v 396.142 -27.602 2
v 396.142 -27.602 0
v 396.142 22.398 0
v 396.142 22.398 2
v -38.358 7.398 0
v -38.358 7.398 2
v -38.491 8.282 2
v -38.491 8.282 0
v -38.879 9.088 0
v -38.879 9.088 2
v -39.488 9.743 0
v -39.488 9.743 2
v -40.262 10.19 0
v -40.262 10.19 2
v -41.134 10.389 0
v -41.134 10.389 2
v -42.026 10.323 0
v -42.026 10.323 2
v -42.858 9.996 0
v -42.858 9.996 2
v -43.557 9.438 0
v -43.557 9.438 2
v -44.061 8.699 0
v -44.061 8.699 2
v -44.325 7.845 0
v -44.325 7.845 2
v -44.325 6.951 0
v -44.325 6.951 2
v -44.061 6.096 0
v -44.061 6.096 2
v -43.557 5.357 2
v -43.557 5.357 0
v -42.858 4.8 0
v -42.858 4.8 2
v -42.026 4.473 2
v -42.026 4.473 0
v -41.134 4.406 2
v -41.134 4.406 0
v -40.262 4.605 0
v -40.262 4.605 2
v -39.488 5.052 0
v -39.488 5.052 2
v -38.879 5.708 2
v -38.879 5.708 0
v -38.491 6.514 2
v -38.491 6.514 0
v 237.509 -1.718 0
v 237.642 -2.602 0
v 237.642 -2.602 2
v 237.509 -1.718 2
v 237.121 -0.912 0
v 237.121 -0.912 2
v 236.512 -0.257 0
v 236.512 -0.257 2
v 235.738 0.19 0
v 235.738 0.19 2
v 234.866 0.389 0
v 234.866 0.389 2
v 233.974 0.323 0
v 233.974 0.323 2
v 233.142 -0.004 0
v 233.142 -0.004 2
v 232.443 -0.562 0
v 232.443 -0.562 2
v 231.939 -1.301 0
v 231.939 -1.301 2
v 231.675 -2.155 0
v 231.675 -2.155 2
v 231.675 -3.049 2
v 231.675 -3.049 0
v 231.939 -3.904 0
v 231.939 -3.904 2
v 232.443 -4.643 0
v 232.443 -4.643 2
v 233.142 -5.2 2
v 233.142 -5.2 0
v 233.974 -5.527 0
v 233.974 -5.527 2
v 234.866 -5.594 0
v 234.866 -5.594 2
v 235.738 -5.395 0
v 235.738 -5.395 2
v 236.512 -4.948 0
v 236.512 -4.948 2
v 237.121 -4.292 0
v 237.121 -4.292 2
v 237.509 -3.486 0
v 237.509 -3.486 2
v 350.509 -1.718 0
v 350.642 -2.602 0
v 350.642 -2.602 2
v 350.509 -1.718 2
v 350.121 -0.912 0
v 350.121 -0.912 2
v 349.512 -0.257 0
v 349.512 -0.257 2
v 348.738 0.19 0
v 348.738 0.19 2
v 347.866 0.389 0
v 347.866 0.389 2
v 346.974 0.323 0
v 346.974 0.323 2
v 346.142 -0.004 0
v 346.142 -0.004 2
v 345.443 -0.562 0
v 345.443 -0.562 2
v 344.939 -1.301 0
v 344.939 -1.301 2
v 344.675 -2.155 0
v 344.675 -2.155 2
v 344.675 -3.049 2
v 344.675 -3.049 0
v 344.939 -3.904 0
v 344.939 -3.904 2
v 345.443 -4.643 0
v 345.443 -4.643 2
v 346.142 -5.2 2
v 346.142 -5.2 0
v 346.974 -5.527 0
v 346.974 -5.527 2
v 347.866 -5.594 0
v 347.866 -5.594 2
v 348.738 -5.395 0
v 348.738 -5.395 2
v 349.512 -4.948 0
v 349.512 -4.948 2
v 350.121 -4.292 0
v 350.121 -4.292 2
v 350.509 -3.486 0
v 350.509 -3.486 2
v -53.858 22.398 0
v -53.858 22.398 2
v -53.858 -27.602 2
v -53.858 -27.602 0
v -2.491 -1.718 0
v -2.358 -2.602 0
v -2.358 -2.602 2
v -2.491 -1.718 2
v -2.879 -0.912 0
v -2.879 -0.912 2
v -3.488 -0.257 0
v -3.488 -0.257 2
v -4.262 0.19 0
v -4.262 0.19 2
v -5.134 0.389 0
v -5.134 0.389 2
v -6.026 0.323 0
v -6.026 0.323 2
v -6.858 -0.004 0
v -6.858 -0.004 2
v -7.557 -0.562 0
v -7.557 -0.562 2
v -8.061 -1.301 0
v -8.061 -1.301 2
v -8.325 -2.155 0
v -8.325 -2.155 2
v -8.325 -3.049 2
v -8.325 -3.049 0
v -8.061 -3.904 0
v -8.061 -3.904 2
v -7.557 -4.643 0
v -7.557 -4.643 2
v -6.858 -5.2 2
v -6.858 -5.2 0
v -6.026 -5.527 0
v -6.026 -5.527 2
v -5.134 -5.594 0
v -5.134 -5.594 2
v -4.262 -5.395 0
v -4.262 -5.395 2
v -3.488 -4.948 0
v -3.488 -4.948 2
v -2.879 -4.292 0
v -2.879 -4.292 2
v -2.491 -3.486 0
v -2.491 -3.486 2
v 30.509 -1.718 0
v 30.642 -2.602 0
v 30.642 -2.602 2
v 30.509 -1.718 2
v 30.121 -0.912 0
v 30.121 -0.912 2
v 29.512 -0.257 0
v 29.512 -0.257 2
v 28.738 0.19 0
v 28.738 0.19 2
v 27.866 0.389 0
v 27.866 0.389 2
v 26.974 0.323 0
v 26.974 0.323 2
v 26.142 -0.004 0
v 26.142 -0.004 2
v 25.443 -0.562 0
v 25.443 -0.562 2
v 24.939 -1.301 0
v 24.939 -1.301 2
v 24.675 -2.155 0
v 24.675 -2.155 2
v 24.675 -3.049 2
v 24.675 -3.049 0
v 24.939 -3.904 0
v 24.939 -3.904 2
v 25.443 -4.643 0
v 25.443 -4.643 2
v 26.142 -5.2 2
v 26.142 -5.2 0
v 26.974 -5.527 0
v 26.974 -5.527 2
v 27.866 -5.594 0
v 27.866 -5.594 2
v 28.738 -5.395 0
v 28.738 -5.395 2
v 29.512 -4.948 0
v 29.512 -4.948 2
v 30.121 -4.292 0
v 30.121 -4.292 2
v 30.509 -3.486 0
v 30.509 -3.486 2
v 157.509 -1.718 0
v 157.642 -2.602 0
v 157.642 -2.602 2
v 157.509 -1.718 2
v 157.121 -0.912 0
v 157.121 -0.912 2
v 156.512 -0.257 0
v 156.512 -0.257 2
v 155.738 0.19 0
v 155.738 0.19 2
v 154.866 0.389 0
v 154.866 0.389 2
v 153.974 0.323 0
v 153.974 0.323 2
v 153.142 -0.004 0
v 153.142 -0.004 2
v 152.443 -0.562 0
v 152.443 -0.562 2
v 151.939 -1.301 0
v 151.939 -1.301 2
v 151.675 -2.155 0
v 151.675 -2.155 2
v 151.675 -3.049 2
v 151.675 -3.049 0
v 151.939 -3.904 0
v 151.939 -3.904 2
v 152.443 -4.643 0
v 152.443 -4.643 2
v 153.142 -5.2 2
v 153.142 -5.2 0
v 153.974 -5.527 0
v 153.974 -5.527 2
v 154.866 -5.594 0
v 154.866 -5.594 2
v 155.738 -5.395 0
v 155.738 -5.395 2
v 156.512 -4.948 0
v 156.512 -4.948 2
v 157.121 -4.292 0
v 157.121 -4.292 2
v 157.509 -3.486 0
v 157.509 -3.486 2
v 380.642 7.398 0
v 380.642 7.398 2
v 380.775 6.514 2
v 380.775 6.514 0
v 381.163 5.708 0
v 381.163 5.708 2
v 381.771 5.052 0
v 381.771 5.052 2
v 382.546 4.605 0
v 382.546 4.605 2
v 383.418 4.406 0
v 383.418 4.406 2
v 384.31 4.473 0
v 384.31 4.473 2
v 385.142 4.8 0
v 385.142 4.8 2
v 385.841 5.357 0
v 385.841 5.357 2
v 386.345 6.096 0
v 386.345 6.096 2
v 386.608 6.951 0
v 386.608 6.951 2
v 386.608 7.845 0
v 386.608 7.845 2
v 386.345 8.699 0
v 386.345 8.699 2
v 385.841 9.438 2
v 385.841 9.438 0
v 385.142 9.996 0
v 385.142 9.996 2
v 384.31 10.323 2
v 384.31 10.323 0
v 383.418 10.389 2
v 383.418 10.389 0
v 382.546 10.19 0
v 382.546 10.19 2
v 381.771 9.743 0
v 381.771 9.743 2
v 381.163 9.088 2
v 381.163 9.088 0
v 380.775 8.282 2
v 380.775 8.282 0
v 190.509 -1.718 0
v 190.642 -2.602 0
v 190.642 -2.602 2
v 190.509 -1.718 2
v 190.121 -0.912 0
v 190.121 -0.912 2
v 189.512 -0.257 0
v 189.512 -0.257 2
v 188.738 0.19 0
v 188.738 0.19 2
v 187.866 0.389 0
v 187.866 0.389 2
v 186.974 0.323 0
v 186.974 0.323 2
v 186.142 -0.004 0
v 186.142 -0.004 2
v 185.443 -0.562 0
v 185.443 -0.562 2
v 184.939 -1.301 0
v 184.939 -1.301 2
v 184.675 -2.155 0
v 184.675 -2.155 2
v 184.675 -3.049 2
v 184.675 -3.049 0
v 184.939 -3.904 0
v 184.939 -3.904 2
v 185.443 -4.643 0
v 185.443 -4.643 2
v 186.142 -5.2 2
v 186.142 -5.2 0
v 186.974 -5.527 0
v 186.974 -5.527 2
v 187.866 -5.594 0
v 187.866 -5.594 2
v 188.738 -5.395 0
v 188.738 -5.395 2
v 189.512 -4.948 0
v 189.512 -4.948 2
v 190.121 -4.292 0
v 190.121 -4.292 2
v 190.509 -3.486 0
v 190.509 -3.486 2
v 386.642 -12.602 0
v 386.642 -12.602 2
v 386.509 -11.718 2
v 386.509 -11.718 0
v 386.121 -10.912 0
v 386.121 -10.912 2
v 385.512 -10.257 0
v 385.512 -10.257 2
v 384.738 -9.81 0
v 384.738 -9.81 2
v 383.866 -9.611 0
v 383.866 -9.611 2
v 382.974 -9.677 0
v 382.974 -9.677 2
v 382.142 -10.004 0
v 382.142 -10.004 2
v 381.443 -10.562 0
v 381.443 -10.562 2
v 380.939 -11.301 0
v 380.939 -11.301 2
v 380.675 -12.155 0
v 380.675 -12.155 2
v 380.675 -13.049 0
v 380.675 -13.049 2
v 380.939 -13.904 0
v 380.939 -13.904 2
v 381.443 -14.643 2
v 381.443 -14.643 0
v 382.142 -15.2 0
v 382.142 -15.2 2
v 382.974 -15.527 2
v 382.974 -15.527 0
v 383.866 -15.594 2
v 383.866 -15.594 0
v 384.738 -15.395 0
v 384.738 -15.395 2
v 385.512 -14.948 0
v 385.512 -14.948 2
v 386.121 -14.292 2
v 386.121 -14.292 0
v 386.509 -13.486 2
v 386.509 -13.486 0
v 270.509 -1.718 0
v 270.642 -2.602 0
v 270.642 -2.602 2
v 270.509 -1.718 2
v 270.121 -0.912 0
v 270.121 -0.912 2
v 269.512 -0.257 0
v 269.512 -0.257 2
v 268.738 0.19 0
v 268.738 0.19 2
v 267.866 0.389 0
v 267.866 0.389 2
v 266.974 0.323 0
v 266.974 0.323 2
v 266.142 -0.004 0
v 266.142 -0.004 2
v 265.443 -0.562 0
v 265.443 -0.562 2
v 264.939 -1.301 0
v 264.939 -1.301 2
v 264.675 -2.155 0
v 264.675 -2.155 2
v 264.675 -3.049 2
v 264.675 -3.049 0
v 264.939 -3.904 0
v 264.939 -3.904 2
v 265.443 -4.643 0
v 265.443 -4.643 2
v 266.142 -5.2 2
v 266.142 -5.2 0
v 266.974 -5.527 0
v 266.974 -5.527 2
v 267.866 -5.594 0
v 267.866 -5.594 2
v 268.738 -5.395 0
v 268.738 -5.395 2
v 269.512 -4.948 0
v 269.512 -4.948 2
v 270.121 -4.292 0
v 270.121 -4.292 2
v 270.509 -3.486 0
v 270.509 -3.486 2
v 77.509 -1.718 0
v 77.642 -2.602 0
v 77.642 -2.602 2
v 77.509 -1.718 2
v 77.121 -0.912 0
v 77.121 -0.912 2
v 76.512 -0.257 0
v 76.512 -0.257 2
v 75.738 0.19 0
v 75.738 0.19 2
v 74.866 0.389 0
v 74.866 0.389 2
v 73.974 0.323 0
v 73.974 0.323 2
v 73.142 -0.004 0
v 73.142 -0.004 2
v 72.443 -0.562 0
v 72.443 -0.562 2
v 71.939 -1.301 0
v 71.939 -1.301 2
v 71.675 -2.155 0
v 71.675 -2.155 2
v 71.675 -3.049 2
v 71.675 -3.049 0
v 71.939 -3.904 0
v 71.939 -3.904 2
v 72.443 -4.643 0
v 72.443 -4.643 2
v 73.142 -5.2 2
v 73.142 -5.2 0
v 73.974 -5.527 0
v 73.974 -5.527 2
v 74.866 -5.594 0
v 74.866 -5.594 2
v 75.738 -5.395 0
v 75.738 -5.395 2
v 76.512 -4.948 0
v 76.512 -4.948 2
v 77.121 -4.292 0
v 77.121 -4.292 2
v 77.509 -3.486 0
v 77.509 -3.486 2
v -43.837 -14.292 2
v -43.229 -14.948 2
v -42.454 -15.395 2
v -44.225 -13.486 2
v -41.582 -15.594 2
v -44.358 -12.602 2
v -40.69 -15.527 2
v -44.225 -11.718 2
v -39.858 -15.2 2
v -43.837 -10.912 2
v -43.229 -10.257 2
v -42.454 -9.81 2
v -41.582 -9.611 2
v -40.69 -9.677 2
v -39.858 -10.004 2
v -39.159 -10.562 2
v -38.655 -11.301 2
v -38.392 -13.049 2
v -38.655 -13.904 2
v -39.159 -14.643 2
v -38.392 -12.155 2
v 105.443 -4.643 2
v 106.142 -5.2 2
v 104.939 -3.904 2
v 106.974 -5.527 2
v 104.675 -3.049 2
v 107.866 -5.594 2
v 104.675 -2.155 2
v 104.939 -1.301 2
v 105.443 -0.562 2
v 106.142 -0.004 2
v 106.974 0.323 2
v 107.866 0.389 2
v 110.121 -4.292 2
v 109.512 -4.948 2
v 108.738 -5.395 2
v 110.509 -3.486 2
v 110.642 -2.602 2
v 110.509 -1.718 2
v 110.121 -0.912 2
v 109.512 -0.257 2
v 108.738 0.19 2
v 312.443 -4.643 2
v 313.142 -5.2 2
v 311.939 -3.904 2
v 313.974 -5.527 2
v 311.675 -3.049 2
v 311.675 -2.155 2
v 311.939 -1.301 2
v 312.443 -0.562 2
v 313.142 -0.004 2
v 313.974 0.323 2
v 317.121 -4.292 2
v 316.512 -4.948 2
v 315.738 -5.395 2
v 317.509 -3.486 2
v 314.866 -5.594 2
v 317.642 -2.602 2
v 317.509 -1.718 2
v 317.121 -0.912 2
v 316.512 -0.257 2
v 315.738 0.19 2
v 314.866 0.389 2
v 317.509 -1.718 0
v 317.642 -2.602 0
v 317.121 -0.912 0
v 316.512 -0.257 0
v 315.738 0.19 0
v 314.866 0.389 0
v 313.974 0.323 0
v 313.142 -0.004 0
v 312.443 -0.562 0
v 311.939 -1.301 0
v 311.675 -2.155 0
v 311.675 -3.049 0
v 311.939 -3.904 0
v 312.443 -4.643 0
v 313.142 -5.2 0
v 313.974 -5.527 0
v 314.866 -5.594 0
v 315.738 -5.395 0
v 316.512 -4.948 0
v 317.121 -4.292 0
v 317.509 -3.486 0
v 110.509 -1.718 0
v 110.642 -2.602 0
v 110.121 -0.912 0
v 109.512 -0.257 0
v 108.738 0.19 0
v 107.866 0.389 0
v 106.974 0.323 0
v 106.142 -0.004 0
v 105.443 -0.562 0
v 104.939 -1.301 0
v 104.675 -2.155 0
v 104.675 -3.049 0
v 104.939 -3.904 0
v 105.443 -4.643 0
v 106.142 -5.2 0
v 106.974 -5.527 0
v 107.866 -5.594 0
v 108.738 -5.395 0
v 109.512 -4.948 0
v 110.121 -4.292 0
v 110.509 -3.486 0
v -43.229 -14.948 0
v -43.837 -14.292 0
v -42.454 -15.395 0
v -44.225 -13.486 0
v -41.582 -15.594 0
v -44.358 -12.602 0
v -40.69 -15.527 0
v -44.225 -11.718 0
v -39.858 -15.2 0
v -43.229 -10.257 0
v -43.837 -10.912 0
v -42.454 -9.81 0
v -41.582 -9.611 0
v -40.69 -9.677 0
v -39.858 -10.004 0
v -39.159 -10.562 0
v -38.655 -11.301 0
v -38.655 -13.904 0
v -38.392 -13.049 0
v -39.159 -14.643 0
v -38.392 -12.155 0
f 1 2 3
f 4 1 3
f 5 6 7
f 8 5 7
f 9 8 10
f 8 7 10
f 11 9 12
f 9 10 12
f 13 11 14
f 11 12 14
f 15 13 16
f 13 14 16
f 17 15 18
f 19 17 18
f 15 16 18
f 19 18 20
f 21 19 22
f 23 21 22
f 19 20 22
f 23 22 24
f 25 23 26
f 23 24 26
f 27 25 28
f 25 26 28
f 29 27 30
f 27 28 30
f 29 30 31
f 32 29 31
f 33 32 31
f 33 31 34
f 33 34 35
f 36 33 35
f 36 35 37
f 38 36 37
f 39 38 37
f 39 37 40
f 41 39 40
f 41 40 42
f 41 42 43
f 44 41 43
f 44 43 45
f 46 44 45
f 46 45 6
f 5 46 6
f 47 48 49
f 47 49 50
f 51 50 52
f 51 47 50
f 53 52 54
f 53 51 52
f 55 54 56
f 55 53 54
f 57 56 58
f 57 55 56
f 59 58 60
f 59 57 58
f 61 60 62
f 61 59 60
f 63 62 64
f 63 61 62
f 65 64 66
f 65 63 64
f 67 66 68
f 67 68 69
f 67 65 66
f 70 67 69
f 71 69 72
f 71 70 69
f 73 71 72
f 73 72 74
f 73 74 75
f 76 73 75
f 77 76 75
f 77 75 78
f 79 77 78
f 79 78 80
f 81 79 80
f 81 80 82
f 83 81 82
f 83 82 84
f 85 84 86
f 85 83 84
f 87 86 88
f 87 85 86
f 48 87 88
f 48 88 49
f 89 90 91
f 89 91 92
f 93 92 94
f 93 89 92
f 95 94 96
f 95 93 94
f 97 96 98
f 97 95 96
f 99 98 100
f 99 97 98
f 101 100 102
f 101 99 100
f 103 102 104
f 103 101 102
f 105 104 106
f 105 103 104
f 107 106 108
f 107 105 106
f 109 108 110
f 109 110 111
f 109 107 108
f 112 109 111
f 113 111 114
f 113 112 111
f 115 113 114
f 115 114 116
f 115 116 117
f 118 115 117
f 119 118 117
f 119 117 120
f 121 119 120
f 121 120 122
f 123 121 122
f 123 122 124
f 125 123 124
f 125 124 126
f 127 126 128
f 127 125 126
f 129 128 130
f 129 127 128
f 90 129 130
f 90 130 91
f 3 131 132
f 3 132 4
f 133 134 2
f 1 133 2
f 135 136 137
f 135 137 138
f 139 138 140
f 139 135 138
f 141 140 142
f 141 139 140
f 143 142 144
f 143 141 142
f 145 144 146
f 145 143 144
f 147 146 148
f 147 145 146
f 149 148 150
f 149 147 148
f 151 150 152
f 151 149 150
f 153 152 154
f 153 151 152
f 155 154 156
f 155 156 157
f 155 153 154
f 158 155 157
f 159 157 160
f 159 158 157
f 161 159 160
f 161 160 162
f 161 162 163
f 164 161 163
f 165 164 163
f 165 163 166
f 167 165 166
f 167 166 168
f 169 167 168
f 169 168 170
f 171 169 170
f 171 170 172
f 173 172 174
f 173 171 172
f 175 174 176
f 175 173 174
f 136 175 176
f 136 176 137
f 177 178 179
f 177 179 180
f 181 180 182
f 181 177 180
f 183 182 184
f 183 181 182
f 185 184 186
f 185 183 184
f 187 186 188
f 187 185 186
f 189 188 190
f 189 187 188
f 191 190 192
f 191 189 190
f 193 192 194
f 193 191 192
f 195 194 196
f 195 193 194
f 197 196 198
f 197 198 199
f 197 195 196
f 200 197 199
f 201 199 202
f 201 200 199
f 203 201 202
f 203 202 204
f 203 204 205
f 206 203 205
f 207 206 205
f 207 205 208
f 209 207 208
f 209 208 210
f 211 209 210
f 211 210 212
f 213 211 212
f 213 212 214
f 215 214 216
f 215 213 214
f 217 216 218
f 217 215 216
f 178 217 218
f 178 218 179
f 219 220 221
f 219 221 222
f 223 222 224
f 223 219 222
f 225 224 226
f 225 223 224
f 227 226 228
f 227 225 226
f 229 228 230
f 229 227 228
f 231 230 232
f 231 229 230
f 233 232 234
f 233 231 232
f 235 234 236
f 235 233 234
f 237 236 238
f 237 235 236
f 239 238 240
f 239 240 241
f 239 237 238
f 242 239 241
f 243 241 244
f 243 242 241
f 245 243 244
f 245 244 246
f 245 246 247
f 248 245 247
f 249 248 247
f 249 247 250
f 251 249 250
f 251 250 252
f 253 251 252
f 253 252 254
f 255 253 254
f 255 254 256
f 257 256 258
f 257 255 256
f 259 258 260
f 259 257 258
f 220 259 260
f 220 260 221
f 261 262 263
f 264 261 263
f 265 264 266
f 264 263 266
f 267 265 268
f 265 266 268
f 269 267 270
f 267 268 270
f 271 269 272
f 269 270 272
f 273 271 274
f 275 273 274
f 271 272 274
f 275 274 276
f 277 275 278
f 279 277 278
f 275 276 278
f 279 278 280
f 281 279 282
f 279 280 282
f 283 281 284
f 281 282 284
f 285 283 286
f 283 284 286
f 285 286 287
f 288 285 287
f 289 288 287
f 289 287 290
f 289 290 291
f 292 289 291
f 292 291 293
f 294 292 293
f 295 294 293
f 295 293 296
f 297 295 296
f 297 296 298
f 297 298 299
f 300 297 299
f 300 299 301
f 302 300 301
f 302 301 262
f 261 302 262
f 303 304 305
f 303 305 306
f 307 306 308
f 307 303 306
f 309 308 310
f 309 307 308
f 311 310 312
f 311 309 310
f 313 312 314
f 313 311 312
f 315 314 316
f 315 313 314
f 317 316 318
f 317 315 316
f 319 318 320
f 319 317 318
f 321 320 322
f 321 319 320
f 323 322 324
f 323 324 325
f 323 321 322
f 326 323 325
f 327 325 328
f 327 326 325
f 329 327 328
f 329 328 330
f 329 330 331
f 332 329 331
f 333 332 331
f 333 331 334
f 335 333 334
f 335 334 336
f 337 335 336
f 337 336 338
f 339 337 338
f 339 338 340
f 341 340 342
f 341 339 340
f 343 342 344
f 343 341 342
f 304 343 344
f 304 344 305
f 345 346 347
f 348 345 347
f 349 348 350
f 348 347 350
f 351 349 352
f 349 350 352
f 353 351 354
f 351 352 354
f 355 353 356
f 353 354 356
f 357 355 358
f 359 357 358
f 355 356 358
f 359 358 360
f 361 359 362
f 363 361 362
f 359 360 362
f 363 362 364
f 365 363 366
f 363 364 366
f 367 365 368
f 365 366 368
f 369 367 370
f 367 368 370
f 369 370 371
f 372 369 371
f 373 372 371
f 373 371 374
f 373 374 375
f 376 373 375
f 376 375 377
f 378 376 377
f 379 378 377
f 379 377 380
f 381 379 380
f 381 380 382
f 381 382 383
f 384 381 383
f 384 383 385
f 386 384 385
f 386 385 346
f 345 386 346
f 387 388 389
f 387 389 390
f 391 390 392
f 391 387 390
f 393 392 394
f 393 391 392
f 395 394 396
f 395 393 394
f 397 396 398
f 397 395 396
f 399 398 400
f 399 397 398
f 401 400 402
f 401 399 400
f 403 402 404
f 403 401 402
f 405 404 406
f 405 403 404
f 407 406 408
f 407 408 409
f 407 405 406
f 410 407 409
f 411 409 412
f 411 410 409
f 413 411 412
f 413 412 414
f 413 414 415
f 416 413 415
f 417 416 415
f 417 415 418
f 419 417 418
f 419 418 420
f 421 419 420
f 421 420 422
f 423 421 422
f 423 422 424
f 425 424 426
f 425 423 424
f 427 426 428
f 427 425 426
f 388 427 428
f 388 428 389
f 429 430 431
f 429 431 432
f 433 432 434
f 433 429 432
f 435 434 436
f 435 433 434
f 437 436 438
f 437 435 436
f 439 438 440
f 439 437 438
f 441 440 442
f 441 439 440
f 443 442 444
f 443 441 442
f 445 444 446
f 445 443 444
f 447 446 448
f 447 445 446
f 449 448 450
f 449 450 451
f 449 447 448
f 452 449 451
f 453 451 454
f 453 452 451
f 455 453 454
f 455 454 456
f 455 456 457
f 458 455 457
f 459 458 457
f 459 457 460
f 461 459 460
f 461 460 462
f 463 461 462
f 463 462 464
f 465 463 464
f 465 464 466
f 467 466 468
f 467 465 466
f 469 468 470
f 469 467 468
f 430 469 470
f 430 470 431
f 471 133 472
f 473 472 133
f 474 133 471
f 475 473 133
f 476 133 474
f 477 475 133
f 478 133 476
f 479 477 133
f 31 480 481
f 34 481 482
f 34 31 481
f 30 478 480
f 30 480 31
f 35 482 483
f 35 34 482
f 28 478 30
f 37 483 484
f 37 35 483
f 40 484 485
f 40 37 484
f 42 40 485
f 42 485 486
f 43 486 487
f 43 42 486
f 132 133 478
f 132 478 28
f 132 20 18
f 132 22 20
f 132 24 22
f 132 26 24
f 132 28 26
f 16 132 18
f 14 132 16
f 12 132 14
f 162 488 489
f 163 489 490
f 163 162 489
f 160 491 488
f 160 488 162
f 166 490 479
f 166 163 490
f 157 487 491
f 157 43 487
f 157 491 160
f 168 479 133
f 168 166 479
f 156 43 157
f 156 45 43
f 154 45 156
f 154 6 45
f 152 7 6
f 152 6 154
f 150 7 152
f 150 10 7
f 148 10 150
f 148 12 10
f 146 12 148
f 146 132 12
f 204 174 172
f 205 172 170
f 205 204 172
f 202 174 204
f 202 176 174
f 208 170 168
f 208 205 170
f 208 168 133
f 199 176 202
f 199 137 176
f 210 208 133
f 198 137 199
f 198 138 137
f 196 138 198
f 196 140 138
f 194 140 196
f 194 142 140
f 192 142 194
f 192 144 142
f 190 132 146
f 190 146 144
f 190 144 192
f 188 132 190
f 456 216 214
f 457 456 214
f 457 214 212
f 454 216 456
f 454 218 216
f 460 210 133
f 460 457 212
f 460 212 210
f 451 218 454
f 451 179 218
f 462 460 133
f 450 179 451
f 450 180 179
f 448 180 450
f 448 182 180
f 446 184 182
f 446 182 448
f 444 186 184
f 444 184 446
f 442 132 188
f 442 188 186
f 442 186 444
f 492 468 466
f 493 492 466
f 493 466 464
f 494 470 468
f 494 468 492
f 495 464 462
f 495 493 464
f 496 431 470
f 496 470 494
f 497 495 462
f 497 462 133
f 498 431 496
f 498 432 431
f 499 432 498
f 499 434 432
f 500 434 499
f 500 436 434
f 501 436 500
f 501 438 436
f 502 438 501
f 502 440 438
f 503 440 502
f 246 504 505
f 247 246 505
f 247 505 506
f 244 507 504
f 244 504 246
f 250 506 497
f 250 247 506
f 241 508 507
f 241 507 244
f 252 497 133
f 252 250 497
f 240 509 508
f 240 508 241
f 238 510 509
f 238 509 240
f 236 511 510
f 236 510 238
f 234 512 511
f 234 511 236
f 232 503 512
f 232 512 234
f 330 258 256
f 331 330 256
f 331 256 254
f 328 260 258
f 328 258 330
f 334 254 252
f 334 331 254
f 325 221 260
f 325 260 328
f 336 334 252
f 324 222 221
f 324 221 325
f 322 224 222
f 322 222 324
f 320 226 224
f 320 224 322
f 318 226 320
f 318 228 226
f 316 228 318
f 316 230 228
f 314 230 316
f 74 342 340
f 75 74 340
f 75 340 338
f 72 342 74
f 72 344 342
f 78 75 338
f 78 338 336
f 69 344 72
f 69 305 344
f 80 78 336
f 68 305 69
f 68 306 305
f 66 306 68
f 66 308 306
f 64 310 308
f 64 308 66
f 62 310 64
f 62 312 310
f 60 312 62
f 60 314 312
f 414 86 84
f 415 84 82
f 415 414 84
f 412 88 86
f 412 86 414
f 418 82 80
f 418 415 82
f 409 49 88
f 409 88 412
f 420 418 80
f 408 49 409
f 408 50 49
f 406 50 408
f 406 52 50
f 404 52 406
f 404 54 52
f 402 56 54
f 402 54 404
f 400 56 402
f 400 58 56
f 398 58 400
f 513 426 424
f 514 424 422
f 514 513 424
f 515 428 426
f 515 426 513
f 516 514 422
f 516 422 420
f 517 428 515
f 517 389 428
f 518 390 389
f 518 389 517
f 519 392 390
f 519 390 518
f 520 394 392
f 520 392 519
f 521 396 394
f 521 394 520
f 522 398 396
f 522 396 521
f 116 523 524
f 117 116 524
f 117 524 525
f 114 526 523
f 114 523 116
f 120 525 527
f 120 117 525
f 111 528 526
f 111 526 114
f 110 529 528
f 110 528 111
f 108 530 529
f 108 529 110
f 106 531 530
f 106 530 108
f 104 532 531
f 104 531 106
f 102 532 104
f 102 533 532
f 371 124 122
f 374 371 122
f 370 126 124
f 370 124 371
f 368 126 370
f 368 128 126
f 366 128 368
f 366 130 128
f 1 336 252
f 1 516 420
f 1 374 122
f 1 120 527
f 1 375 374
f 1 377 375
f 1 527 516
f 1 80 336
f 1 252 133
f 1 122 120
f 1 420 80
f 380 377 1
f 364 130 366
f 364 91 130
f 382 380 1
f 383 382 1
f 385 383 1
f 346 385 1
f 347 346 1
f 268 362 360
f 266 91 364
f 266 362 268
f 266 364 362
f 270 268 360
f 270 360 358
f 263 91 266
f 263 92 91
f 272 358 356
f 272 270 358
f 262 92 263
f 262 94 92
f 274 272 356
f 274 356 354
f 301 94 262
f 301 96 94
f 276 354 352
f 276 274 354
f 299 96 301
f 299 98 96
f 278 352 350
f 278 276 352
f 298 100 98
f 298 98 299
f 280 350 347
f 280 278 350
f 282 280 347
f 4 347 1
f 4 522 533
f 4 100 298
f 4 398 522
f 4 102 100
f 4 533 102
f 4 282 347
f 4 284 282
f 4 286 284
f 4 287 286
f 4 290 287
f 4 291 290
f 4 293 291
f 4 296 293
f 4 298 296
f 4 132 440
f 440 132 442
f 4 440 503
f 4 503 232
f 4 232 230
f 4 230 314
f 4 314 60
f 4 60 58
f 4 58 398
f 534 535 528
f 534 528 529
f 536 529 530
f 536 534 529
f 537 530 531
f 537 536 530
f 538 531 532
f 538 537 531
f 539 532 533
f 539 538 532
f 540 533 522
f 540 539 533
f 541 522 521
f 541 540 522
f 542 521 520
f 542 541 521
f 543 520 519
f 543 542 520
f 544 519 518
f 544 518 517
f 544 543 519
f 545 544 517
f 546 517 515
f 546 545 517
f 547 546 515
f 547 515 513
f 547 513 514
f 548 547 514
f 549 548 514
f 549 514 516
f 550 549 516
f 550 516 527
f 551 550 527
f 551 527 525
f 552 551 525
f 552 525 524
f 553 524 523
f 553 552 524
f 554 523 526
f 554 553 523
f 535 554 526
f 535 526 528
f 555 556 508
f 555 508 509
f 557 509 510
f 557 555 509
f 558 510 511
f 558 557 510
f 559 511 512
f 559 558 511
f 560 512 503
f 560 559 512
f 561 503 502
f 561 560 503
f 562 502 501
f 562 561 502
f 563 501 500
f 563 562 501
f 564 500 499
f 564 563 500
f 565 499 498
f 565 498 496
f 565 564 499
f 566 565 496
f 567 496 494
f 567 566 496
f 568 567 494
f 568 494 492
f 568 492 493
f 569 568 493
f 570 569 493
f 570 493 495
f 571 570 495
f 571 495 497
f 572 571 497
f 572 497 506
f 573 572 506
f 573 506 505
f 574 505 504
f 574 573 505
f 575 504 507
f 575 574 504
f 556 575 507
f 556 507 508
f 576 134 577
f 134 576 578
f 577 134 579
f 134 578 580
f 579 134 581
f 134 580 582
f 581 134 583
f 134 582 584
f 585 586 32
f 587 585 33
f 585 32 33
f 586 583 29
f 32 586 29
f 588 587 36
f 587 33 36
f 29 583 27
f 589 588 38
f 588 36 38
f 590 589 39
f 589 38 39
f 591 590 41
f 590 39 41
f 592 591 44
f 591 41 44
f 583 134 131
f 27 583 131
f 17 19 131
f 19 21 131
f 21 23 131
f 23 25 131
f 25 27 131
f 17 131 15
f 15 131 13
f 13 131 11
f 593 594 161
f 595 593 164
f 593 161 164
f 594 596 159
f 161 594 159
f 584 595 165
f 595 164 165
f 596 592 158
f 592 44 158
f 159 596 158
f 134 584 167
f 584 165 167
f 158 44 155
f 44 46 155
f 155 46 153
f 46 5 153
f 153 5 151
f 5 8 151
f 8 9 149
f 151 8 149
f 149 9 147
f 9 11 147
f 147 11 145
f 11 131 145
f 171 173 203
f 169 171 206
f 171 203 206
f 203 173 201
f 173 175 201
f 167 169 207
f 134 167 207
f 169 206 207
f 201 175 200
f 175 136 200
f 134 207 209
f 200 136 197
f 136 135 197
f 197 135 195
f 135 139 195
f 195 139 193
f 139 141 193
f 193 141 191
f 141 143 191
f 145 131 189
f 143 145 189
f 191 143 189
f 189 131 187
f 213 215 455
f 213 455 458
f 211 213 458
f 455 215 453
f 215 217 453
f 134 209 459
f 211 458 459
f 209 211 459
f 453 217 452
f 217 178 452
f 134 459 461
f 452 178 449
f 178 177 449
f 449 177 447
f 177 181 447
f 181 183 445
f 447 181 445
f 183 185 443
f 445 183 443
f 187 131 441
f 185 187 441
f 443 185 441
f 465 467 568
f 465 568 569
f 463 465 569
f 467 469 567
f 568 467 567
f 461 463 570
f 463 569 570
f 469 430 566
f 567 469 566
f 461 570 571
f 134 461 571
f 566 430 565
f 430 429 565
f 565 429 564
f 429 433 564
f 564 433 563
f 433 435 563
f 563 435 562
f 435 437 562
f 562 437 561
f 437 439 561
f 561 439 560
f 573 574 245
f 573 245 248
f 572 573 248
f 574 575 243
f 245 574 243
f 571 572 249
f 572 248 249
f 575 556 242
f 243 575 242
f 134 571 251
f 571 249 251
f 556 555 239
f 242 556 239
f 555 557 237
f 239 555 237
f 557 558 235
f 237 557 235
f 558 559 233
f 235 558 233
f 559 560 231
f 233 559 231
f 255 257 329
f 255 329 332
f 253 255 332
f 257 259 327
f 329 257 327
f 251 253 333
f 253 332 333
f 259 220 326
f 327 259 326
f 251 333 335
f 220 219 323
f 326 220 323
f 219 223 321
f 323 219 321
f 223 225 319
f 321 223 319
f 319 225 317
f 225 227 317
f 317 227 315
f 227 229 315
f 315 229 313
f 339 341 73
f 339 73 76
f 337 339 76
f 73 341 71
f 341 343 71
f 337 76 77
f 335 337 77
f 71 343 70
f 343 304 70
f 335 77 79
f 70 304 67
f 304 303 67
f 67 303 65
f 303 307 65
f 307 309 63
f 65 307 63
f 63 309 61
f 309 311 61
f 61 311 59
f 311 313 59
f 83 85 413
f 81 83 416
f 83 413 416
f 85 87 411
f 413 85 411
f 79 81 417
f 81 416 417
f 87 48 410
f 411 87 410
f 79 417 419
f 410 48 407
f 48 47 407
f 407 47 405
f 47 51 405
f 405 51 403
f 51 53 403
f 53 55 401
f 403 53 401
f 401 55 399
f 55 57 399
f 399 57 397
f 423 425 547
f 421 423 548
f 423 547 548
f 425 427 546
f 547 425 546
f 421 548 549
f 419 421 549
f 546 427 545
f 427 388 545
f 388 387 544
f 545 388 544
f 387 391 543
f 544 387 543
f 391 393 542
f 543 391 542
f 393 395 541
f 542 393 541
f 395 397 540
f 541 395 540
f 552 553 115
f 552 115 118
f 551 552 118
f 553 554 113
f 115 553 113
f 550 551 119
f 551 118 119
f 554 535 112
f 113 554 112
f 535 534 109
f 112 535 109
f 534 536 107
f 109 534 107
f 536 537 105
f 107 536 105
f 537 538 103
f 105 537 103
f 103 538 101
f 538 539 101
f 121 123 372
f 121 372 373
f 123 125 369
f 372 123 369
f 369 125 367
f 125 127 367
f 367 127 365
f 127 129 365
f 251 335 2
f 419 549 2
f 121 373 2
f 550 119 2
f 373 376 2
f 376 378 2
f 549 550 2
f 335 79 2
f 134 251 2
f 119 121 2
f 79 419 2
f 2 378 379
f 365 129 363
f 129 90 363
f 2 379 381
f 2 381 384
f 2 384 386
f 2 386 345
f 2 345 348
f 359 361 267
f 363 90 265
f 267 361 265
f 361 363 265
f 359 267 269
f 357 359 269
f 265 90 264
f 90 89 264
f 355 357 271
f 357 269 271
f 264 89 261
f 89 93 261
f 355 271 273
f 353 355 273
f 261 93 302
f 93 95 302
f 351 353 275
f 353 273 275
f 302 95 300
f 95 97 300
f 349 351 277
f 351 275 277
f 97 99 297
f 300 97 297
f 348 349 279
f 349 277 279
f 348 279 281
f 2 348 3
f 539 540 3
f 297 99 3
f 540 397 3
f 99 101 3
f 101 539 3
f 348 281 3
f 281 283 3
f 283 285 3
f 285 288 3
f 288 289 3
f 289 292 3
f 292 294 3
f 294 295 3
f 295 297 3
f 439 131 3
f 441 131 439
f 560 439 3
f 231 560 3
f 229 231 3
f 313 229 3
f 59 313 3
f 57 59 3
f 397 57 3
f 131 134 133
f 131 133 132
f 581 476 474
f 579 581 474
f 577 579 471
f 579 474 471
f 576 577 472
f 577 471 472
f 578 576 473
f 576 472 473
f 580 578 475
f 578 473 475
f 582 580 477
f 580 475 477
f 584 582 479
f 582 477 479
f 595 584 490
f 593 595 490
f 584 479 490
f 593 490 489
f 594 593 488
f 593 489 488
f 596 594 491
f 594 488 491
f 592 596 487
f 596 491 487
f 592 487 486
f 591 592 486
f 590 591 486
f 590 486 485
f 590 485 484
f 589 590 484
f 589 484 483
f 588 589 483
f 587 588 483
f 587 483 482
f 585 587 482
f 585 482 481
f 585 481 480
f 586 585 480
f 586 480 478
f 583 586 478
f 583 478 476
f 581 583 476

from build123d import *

# Parameters (mm, degrees)
SKETCH_1_W          = 450
SKETCH_1_H          = 50
SKETCH_1_R          = 3
EXTRUDE_1_DEPTH     = 2
SKETCH_2_R          = 3
CUT_EXTRUDE_1_DEPTH = 3


with BuildPart() as part:
    # Эскиз1 → Бобышка-Вытянуть1 (new body)
    with BuildSketch(Plane.XY):
        with Locations((171.141952991, -2.602230483)):
            Rectangle(SKETCH_1_W, SKETCH_1_H)
        with Locations((-5.358047009, -2.602230483)):
            Circle(SKETCH_1_R, mode=Mode.SUBTRACT)
        with Locations((27.641952991, -2.602230483)):
            Circle(SKETCH_1_R, mode=Mode.SUBTRACT)
        with Locations((74.641952991, -2.602230483)):
            Circle(SKETCH_1_R, mode=Mode.SUBTRACT)
        with Locations((107.641952991, -2.602230483)):
            Circle(SKETCH_1_R, mode=Mode.SUBTRACT)
        with Locations((154.641952991, -2.602230483)):
            Circle(SKETCH_1_R, mode=Mode.SUBTRACT)
        with Locations((187.641952991, -2.602230483)):
            Circle(SKETCH_1_R, mode=Mode.SUBTRACT)
        with Locations((234.641952991, -2.602230483)):
            Circle(SKETCH_1_R, mode=Mode.SUBTRACT)
        with Locations((267.641952991, -2.602230483)):
            Circle(SKETCH_1_R, mode=Mode.SUBTRACT)
        with Locations((314.641952991, -2.602230483)):
            Circle(SKETCH_1_R, mode=Mode.SUBTRACT)
        with Locations((347.641952991, -2.602230483)):
            Circle(SKETCH_1_R, mode=Mode.SUBTRACT)
    extrude(amount=EXTRUDE_1_DEPTH)

    # Эскиз2 → Вырез-Вытянуть1 (cut, through all)
    with BuildSketch(Plane.XY.offset(2)):
        with Locations((-41.358047009, 7.397769517)):
            Circle(SKETCH_2_R)
        with Locations(Location((-41.358047009, -12.602230483, 0), (0, 0, 180))):  # turned: the seam where the file's is
            Circle(SKETCH_2_R)
        with Locations((383.641952991, -12.602230483)):
            Circle(SKETCH_2_R)
        with Locations(Location((383.641952991, 7.397769517, 0), (0, 0, 180))):  # turned: the seam where the file's is
            Circle(SKETCH_2_R)
    extrude(amount=-CUT_EXTRUDE_1_DEPTH, mode=Mode.SUBTRACT)


solid = part.part
